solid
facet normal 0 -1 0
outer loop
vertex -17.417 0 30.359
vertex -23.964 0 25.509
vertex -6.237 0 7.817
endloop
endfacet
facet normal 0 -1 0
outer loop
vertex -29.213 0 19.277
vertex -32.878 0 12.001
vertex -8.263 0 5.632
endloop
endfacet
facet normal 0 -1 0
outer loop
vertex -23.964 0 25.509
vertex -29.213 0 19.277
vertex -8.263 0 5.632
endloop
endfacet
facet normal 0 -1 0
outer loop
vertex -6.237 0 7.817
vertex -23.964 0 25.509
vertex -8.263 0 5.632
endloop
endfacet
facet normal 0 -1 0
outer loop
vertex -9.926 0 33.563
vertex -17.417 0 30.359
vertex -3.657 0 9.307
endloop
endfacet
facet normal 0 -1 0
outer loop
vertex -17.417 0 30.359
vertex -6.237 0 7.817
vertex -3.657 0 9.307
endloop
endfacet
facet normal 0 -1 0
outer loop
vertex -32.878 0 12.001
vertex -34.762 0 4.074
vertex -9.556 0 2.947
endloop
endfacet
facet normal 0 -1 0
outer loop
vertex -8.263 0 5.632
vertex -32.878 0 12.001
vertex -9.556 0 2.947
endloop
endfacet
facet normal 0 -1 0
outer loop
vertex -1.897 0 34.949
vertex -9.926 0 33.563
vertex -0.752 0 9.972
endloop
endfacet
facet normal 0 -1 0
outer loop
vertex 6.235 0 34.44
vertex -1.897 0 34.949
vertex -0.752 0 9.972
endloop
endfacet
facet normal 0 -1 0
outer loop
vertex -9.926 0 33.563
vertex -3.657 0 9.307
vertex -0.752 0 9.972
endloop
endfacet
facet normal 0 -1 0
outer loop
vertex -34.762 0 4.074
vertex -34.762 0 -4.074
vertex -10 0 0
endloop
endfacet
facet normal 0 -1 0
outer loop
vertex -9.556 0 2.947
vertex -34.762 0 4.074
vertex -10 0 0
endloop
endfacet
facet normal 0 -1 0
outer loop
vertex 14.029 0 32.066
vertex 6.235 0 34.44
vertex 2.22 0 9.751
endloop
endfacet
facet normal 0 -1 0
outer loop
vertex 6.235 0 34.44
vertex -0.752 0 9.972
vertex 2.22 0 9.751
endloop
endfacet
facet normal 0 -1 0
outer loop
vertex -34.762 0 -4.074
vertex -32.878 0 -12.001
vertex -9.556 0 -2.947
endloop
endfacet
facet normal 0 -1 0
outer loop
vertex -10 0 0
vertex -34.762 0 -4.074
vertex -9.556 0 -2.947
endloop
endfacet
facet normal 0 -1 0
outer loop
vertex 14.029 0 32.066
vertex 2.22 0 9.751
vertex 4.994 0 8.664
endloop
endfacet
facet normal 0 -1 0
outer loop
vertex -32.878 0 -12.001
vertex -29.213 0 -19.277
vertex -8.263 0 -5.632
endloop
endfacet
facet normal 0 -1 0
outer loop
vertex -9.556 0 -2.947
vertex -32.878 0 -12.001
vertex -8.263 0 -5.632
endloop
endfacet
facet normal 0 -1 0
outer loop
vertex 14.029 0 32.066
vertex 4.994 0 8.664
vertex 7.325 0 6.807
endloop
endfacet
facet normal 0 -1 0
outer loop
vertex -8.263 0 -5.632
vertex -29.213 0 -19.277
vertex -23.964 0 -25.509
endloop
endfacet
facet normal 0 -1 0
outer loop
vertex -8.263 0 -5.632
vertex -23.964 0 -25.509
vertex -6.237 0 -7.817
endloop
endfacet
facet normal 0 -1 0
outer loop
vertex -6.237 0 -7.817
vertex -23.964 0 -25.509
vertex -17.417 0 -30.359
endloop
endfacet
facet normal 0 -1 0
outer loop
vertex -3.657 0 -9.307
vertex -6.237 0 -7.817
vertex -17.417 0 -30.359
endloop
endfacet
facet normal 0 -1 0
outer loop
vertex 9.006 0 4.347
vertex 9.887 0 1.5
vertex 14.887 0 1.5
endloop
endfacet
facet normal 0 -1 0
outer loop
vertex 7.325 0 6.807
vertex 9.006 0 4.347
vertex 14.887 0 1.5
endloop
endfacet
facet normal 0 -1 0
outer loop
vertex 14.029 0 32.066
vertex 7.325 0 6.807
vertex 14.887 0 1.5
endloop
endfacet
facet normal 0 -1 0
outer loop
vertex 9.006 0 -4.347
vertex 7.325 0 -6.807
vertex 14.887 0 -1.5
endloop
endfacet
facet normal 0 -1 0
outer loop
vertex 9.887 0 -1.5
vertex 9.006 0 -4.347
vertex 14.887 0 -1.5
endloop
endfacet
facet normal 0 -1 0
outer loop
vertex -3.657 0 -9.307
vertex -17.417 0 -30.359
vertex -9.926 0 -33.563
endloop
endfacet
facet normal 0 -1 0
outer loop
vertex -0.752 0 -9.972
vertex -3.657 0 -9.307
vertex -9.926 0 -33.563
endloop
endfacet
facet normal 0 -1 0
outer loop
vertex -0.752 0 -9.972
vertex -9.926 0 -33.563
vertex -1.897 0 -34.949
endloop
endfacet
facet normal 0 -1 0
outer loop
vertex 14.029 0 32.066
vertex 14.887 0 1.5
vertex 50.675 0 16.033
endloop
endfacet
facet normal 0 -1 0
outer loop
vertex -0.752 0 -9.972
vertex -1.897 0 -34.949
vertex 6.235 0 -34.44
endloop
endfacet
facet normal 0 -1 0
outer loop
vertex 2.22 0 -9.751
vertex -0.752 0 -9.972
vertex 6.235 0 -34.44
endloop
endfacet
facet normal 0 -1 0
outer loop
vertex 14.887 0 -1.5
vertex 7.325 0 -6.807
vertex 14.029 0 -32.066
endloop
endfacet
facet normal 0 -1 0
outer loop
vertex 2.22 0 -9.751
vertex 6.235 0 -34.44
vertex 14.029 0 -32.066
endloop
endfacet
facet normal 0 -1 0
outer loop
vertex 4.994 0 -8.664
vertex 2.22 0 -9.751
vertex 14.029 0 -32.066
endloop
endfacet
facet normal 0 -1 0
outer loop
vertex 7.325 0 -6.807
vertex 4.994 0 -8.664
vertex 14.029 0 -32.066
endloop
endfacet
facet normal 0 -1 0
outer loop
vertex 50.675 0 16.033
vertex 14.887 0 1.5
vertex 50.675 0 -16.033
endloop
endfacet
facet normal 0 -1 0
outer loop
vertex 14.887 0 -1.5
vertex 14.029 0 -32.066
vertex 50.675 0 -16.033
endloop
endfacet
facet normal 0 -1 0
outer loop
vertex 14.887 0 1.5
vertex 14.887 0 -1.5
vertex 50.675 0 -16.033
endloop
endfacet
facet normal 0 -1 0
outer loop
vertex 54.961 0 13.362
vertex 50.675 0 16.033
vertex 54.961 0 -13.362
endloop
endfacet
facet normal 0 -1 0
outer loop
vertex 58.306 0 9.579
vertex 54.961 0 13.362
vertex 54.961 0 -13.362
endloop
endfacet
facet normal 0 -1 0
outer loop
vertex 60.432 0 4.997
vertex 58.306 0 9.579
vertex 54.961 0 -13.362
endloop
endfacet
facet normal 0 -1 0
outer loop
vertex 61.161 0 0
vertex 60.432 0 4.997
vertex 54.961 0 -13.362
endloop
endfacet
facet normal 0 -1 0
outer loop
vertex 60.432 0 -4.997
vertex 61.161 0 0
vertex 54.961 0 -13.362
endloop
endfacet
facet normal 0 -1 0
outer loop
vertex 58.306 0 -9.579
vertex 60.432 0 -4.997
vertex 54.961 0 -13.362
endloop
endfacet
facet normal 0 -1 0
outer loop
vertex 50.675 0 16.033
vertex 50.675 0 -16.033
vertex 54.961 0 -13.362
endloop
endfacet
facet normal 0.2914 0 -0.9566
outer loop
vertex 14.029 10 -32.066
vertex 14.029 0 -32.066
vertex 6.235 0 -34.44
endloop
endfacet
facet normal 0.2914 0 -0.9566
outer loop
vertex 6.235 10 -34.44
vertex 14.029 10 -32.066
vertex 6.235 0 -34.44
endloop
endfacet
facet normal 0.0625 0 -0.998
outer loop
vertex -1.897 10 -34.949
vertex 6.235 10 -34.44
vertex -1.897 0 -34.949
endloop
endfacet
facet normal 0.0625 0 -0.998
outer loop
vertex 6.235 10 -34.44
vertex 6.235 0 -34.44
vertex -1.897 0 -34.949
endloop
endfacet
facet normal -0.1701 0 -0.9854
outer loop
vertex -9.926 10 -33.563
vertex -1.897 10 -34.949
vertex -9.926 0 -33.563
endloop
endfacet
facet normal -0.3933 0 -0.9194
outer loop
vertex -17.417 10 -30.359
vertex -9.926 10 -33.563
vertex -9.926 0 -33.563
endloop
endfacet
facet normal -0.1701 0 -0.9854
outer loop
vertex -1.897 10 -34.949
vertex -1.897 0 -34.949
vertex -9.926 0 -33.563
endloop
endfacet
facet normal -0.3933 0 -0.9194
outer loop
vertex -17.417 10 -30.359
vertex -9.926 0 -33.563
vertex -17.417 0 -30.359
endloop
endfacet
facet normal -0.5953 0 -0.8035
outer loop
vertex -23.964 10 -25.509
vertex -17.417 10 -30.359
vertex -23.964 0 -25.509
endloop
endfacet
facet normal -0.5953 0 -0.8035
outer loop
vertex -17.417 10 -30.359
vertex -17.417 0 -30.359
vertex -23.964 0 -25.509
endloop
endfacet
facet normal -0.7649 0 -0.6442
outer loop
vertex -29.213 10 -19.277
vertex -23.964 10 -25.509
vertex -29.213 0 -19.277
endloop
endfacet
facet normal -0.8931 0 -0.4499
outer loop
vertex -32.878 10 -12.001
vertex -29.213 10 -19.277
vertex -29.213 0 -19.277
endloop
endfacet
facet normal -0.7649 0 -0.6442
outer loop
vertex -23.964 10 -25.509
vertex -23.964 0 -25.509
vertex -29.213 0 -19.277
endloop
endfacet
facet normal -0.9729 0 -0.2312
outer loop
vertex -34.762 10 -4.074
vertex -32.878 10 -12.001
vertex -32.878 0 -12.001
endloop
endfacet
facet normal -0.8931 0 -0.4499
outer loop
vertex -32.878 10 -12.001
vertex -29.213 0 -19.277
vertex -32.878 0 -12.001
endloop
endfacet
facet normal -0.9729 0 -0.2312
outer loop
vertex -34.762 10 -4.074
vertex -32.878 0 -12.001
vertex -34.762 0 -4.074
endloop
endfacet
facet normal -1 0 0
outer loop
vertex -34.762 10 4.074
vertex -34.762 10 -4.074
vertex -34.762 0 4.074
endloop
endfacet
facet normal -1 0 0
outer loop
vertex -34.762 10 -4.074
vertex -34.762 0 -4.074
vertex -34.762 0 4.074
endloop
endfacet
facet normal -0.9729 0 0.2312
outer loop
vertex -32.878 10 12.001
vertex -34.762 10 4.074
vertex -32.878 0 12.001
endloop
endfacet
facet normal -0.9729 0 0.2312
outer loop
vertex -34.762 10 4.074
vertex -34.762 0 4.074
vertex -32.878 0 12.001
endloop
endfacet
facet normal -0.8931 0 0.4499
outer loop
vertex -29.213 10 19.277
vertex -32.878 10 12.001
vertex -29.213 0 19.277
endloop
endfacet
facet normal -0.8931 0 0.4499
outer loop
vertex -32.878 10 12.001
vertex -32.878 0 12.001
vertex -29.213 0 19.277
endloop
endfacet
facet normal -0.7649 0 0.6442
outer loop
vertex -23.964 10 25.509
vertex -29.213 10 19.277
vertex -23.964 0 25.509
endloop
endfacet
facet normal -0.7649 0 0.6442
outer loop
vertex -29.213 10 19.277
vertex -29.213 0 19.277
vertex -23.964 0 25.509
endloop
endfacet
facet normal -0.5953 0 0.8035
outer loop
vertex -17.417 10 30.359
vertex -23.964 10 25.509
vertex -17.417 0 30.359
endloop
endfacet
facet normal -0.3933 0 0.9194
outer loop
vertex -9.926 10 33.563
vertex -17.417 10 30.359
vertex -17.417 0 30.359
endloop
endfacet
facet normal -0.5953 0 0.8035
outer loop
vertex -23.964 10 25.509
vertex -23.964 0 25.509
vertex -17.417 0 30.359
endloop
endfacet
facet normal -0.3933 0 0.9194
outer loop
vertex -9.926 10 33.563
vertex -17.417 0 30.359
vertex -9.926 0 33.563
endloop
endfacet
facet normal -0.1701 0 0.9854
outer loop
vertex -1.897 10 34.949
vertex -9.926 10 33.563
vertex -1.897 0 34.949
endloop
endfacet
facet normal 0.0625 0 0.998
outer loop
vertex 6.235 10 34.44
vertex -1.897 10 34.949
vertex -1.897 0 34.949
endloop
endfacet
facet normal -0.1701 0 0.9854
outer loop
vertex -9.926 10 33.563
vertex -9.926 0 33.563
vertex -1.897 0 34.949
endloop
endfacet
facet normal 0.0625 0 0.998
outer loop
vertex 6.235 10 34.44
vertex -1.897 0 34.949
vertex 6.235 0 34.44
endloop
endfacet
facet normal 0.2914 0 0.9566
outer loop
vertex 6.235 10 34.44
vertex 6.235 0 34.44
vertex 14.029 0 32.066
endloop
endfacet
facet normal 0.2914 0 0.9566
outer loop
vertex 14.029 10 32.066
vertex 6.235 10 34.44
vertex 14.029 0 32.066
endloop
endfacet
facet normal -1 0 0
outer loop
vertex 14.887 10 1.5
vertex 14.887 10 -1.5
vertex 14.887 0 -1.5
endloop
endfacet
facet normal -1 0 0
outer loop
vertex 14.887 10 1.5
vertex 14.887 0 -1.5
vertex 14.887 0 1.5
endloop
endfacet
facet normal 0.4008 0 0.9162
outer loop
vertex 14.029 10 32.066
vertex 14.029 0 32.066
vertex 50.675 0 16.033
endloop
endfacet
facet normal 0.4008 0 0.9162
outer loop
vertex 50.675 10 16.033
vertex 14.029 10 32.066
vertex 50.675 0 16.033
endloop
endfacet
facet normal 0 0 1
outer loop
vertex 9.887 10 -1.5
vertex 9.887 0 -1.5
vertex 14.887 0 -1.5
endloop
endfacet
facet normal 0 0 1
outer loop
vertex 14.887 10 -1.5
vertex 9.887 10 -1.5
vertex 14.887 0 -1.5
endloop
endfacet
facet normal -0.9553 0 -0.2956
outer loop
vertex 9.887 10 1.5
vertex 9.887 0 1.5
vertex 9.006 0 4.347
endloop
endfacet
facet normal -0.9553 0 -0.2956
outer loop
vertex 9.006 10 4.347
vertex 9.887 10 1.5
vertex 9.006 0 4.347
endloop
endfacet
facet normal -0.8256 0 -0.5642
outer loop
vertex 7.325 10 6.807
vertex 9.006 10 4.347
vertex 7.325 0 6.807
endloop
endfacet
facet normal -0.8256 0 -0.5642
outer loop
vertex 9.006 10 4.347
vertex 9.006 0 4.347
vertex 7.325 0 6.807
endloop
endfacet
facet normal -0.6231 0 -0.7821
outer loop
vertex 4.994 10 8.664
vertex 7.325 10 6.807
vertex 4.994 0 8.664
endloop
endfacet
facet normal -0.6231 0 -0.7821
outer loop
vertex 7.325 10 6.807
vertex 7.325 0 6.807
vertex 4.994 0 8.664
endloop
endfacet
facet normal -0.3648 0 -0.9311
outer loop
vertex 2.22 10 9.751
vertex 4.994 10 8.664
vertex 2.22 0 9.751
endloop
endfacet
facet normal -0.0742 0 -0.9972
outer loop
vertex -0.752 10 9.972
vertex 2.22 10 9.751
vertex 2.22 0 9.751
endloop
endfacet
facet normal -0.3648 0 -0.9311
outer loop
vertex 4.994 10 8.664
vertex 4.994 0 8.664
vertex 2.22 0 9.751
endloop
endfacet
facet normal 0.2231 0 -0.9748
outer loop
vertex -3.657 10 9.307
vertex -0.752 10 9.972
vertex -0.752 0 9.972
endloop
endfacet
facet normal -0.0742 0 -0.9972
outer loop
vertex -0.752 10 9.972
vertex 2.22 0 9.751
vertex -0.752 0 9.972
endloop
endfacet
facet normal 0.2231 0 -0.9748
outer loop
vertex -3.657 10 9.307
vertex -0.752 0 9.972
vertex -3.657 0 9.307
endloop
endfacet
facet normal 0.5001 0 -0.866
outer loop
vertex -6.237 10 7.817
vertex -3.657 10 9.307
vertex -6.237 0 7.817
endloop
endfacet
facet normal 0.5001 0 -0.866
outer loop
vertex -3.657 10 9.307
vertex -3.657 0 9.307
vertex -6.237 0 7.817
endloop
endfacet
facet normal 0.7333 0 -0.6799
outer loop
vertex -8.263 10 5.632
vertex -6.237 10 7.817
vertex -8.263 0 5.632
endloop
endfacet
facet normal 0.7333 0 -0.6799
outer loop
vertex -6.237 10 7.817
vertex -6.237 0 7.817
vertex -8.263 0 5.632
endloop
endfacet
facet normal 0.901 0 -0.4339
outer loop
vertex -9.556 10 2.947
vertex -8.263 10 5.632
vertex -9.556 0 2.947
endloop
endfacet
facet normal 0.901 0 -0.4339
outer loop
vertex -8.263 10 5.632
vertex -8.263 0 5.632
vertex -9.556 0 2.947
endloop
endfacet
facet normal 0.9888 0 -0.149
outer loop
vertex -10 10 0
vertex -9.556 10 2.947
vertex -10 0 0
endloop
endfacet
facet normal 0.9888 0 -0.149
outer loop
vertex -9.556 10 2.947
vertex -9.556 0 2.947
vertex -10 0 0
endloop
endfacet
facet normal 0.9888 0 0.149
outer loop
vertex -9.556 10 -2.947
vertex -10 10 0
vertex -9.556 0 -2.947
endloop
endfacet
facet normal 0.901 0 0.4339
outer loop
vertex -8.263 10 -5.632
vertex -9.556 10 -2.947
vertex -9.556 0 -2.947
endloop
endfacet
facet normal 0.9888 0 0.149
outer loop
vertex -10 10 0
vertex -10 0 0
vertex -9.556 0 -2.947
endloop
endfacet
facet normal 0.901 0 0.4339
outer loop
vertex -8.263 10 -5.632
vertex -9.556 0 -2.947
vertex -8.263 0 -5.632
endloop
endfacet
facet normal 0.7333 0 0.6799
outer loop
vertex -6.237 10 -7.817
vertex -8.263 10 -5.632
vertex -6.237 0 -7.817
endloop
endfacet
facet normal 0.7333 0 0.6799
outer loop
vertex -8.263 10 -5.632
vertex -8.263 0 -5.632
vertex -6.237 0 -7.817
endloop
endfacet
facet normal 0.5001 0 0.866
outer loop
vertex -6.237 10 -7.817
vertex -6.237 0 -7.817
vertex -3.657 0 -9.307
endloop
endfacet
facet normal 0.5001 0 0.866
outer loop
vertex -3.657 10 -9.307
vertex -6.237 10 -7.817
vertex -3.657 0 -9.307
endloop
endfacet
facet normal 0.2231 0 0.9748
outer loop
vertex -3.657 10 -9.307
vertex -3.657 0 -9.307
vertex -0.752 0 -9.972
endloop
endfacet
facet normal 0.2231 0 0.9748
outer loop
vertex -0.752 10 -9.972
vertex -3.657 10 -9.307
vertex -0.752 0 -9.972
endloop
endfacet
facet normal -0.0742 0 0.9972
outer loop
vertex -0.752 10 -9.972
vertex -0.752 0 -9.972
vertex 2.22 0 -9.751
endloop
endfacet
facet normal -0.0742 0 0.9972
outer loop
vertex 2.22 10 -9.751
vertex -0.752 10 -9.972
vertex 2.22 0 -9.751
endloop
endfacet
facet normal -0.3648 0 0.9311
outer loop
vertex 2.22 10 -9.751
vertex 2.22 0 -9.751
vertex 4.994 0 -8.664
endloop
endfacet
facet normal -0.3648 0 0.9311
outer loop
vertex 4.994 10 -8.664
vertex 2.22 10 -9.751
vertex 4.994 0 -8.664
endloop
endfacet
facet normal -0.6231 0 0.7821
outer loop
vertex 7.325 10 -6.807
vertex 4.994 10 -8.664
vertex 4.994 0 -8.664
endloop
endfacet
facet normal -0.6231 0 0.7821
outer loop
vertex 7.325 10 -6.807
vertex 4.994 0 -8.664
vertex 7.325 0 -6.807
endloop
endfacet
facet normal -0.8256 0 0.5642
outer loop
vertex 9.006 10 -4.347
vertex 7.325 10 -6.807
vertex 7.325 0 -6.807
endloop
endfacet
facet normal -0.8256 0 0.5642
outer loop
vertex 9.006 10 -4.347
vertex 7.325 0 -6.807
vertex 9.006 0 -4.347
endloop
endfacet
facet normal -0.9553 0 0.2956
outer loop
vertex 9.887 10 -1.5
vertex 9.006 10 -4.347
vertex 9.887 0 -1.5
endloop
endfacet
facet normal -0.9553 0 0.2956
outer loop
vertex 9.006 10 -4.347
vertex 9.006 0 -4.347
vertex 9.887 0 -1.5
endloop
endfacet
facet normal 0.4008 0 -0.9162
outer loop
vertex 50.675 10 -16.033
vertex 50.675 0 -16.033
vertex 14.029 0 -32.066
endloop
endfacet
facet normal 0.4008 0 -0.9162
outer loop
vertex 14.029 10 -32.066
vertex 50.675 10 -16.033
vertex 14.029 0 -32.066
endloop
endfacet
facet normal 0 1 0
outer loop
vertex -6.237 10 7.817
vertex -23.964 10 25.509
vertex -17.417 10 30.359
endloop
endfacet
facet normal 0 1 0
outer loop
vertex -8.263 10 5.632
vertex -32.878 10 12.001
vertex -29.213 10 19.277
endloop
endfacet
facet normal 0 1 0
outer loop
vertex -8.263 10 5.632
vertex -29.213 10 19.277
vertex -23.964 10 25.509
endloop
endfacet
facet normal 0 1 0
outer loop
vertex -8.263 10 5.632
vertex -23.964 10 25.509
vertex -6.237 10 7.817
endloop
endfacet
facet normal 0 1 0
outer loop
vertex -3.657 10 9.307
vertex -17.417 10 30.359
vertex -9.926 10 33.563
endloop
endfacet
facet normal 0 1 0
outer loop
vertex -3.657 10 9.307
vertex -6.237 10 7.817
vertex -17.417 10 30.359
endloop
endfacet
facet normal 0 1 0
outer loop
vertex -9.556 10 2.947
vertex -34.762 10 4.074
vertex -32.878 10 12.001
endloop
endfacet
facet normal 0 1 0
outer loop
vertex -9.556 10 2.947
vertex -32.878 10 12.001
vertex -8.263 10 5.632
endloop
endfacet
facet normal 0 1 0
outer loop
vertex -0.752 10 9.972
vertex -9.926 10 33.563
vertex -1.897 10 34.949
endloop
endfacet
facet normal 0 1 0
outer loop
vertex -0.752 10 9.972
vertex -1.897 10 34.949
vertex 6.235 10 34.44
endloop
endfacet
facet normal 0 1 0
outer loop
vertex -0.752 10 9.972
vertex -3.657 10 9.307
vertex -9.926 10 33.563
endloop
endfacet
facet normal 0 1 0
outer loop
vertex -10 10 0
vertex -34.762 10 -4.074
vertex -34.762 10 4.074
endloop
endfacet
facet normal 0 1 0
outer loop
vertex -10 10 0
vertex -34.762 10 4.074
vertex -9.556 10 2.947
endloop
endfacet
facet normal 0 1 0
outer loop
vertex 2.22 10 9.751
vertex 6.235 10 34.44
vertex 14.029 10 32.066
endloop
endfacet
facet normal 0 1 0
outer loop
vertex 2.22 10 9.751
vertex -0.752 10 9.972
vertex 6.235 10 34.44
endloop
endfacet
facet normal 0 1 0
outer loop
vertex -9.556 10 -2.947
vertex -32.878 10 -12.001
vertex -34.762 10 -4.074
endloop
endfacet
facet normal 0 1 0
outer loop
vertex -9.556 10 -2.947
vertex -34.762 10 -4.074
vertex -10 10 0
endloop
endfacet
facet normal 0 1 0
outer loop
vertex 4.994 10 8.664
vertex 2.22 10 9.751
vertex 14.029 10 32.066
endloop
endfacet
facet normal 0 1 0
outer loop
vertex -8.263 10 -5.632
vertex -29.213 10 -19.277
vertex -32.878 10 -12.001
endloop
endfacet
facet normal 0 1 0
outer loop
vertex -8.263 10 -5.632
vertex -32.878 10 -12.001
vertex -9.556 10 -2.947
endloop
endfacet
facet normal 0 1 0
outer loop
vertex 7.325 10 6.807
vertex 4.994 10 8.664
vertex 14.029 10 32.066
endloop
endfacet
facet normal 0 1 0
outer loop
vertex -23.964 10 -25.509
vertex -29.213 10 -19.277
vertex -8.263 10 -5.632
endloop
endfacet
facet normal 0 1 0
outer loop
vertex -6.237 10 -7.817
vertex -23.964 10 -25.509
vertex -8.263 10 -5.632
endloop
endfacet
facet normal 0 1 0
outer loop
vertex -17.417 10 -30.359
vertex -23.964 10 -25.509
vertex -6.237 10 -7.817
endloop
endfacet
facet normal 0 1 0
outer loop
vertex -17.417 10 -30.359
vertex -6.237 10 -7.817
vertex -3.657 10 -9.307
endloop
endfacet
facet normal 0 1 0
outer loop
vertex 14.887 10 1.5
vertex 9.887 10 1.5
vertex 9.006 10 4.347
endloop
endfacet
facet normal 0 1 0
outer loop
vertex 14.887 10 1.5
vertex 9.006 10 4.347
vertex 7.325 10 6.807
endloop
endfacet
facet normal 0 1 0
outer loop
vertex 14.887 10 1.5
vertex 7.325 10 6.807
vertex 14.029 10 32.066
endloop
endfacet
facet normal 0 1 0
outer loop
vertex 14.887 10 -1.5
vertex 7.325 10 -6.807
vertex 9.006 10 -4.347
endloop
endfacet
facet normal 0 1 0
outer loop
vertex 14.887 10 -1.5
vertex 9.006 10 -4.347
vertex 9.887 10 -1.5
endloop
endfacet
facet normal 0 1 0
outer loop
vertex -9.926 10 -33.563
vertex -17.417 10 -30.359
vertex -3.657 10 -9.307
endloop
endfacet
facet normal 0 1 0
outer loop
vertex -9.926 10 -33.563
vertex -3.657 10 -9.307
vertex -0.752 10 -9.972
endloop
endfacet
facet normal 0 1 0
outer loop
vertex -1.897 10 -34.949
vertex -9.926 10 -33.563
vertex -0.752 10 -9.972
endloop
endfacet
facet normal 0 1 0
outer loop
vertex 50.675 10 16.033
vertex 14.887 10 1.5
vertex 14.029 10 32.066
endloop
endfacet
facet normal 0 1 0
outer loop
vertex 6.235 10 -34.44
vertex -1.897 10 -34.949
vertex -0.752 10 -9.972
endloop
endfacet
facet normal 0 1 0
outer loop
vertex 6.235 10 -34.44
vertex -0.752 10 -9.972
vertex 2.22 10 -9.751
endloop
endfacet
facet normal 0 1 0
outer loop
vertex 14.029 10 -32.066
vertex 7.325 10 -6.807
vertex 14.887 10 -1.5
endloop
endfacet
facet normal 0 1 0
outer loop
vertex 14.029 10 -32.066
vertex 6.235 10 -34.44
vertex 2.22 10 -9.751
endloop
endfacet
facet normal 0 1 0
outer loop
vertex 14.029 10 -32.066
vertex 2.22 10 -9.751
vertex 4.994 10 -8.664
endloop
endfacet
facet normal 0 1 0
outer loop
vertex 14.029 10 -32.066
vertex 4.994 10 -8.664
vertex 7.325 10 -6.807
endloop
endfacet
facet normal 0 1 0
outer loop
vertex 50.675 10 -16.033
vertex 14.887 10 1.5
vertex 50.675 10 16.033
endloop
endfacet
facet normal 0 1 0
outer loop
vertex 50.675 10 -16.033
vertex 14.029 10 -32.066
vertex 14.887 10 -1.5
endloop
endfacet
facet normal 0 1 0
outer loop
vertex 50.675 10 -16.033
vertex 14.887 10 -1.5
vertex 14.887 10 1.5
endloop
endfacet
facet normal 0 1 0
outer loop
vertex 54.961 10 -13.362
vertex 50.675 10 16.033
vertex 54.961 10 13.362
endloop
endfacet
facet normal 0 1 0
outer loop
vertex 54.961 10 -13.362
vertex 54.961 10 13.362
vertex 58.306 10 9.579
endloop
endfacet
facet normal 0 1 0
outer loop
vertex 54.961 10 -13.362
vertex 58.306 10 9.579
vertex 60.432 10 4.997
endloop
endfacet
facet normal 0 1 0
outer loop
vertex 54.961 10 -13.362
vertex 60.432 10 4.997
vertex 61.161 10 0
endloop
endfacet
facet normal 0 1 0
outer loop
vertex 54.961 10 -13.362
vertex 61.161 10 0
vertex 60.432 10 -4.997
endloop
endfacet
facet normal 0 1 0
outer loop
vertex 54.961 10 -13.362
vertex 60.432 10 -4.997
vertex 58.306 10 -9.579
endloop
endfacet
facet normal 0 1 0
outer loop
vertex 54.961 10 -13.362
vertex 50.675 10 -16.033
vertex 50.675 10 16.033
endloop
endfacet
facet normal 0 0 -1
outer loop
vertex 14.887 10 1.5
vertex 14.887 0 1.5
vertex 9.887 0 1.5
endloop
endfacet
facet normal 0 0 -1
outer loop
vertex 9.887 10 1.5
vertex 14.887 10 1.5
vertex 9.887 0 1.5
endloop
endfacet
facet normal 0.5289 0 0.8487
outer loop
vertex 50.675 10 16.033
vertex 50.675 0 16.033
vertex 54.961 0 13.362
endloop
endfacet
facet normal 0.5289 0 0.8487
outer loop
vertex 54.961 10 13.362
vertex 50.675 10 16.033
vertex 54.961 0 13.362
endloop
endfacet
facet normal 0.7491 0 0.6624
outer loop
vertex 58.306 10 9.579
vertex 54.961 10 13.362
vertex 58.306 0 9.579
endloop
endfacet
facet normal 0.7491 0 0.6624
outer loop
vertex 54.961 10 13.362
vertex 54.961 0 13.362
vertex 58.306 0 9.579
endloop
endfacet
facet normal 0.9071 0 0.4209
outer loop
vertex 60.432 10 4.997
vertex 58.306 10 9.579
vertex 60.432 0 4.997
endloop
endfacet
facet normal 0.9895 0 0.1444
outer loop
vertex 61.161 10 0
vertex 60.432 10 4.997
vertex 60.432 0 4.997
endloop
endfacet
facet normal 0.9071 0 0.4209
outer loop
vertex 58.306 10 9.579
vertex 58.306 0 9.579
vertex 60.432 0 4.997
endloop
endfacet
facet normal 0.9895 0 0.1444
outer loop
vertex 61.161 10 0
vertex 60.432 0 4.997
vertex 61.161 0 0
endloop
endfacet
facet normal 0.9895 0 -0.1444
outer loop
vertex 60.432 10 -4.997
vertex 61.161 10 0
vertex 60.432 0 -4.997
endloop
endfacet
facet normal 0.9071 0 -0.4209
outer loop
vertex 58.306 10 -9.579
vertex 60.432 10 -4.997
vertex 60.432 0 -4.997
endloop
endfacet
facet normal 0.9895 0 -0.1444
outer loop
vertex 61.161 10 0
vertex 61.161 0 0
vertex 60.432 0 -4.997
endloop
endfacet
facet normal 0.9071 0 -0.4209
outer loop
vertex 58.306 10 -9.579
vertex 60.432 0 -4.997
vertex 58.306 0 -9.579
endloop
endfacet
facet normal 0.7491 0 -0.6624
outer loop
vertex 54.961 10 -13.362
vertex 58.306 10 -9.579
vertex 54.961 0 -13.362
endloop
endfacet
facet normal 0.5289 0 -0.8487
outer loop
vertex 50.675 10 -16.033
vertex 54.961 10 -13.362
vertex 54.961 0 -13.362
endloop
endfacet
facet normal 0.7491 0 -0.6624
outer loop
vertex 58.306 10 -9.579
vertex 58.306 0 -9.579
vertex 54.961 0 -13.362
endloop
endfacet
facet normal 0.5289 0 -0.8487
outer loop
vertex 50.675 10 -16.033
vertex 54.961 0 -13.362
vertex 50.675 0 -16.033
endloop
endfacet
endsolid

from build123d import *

# Parameters (mm, degrees)
BOSS_EXTRUDE1_DEPTH = 10


with BuildPart() as part:
    # Sketch1 → Boss-Extrude1 (new body)
    with BuildSketch(Plane(origin=(0, 0, 0), x_dir=(1, 0, 0), z_dir=(0, 1, 0))):
        with BuildLine():
            ThreePointArc((14.028659191, 32.065506722), (-35, 0), (14.028659191, -32.065506722))
            Line((14.028659191, -32.065506722), (50.674952587, -16.032753361))
            ThreePointArc((50.674952587, -16.032753361), (61.160622991, 0), (50.674952587, 16.032753361))
            Line((50.674952587, 16.032753361), (14.028659191, 32.065506722))
        make_face()
        with BuildLine():
            Line((9.886859967, 1.5), (14.886859967, 1.5))
            Line((14.886859967, 1.5), (14.886859967, -1.5))
            Line((14.886859967, -1.5), (9.886859967, -1.5))
            ThreePointArc((9.886859967, -1.5), (-10, 0), (9.886859967, 1.5))
        make_face(mode=Mode.SUBTRACT)
    extrude(amount=BOSS_EXTRUDE1_DEPTH)


solid = part.part
